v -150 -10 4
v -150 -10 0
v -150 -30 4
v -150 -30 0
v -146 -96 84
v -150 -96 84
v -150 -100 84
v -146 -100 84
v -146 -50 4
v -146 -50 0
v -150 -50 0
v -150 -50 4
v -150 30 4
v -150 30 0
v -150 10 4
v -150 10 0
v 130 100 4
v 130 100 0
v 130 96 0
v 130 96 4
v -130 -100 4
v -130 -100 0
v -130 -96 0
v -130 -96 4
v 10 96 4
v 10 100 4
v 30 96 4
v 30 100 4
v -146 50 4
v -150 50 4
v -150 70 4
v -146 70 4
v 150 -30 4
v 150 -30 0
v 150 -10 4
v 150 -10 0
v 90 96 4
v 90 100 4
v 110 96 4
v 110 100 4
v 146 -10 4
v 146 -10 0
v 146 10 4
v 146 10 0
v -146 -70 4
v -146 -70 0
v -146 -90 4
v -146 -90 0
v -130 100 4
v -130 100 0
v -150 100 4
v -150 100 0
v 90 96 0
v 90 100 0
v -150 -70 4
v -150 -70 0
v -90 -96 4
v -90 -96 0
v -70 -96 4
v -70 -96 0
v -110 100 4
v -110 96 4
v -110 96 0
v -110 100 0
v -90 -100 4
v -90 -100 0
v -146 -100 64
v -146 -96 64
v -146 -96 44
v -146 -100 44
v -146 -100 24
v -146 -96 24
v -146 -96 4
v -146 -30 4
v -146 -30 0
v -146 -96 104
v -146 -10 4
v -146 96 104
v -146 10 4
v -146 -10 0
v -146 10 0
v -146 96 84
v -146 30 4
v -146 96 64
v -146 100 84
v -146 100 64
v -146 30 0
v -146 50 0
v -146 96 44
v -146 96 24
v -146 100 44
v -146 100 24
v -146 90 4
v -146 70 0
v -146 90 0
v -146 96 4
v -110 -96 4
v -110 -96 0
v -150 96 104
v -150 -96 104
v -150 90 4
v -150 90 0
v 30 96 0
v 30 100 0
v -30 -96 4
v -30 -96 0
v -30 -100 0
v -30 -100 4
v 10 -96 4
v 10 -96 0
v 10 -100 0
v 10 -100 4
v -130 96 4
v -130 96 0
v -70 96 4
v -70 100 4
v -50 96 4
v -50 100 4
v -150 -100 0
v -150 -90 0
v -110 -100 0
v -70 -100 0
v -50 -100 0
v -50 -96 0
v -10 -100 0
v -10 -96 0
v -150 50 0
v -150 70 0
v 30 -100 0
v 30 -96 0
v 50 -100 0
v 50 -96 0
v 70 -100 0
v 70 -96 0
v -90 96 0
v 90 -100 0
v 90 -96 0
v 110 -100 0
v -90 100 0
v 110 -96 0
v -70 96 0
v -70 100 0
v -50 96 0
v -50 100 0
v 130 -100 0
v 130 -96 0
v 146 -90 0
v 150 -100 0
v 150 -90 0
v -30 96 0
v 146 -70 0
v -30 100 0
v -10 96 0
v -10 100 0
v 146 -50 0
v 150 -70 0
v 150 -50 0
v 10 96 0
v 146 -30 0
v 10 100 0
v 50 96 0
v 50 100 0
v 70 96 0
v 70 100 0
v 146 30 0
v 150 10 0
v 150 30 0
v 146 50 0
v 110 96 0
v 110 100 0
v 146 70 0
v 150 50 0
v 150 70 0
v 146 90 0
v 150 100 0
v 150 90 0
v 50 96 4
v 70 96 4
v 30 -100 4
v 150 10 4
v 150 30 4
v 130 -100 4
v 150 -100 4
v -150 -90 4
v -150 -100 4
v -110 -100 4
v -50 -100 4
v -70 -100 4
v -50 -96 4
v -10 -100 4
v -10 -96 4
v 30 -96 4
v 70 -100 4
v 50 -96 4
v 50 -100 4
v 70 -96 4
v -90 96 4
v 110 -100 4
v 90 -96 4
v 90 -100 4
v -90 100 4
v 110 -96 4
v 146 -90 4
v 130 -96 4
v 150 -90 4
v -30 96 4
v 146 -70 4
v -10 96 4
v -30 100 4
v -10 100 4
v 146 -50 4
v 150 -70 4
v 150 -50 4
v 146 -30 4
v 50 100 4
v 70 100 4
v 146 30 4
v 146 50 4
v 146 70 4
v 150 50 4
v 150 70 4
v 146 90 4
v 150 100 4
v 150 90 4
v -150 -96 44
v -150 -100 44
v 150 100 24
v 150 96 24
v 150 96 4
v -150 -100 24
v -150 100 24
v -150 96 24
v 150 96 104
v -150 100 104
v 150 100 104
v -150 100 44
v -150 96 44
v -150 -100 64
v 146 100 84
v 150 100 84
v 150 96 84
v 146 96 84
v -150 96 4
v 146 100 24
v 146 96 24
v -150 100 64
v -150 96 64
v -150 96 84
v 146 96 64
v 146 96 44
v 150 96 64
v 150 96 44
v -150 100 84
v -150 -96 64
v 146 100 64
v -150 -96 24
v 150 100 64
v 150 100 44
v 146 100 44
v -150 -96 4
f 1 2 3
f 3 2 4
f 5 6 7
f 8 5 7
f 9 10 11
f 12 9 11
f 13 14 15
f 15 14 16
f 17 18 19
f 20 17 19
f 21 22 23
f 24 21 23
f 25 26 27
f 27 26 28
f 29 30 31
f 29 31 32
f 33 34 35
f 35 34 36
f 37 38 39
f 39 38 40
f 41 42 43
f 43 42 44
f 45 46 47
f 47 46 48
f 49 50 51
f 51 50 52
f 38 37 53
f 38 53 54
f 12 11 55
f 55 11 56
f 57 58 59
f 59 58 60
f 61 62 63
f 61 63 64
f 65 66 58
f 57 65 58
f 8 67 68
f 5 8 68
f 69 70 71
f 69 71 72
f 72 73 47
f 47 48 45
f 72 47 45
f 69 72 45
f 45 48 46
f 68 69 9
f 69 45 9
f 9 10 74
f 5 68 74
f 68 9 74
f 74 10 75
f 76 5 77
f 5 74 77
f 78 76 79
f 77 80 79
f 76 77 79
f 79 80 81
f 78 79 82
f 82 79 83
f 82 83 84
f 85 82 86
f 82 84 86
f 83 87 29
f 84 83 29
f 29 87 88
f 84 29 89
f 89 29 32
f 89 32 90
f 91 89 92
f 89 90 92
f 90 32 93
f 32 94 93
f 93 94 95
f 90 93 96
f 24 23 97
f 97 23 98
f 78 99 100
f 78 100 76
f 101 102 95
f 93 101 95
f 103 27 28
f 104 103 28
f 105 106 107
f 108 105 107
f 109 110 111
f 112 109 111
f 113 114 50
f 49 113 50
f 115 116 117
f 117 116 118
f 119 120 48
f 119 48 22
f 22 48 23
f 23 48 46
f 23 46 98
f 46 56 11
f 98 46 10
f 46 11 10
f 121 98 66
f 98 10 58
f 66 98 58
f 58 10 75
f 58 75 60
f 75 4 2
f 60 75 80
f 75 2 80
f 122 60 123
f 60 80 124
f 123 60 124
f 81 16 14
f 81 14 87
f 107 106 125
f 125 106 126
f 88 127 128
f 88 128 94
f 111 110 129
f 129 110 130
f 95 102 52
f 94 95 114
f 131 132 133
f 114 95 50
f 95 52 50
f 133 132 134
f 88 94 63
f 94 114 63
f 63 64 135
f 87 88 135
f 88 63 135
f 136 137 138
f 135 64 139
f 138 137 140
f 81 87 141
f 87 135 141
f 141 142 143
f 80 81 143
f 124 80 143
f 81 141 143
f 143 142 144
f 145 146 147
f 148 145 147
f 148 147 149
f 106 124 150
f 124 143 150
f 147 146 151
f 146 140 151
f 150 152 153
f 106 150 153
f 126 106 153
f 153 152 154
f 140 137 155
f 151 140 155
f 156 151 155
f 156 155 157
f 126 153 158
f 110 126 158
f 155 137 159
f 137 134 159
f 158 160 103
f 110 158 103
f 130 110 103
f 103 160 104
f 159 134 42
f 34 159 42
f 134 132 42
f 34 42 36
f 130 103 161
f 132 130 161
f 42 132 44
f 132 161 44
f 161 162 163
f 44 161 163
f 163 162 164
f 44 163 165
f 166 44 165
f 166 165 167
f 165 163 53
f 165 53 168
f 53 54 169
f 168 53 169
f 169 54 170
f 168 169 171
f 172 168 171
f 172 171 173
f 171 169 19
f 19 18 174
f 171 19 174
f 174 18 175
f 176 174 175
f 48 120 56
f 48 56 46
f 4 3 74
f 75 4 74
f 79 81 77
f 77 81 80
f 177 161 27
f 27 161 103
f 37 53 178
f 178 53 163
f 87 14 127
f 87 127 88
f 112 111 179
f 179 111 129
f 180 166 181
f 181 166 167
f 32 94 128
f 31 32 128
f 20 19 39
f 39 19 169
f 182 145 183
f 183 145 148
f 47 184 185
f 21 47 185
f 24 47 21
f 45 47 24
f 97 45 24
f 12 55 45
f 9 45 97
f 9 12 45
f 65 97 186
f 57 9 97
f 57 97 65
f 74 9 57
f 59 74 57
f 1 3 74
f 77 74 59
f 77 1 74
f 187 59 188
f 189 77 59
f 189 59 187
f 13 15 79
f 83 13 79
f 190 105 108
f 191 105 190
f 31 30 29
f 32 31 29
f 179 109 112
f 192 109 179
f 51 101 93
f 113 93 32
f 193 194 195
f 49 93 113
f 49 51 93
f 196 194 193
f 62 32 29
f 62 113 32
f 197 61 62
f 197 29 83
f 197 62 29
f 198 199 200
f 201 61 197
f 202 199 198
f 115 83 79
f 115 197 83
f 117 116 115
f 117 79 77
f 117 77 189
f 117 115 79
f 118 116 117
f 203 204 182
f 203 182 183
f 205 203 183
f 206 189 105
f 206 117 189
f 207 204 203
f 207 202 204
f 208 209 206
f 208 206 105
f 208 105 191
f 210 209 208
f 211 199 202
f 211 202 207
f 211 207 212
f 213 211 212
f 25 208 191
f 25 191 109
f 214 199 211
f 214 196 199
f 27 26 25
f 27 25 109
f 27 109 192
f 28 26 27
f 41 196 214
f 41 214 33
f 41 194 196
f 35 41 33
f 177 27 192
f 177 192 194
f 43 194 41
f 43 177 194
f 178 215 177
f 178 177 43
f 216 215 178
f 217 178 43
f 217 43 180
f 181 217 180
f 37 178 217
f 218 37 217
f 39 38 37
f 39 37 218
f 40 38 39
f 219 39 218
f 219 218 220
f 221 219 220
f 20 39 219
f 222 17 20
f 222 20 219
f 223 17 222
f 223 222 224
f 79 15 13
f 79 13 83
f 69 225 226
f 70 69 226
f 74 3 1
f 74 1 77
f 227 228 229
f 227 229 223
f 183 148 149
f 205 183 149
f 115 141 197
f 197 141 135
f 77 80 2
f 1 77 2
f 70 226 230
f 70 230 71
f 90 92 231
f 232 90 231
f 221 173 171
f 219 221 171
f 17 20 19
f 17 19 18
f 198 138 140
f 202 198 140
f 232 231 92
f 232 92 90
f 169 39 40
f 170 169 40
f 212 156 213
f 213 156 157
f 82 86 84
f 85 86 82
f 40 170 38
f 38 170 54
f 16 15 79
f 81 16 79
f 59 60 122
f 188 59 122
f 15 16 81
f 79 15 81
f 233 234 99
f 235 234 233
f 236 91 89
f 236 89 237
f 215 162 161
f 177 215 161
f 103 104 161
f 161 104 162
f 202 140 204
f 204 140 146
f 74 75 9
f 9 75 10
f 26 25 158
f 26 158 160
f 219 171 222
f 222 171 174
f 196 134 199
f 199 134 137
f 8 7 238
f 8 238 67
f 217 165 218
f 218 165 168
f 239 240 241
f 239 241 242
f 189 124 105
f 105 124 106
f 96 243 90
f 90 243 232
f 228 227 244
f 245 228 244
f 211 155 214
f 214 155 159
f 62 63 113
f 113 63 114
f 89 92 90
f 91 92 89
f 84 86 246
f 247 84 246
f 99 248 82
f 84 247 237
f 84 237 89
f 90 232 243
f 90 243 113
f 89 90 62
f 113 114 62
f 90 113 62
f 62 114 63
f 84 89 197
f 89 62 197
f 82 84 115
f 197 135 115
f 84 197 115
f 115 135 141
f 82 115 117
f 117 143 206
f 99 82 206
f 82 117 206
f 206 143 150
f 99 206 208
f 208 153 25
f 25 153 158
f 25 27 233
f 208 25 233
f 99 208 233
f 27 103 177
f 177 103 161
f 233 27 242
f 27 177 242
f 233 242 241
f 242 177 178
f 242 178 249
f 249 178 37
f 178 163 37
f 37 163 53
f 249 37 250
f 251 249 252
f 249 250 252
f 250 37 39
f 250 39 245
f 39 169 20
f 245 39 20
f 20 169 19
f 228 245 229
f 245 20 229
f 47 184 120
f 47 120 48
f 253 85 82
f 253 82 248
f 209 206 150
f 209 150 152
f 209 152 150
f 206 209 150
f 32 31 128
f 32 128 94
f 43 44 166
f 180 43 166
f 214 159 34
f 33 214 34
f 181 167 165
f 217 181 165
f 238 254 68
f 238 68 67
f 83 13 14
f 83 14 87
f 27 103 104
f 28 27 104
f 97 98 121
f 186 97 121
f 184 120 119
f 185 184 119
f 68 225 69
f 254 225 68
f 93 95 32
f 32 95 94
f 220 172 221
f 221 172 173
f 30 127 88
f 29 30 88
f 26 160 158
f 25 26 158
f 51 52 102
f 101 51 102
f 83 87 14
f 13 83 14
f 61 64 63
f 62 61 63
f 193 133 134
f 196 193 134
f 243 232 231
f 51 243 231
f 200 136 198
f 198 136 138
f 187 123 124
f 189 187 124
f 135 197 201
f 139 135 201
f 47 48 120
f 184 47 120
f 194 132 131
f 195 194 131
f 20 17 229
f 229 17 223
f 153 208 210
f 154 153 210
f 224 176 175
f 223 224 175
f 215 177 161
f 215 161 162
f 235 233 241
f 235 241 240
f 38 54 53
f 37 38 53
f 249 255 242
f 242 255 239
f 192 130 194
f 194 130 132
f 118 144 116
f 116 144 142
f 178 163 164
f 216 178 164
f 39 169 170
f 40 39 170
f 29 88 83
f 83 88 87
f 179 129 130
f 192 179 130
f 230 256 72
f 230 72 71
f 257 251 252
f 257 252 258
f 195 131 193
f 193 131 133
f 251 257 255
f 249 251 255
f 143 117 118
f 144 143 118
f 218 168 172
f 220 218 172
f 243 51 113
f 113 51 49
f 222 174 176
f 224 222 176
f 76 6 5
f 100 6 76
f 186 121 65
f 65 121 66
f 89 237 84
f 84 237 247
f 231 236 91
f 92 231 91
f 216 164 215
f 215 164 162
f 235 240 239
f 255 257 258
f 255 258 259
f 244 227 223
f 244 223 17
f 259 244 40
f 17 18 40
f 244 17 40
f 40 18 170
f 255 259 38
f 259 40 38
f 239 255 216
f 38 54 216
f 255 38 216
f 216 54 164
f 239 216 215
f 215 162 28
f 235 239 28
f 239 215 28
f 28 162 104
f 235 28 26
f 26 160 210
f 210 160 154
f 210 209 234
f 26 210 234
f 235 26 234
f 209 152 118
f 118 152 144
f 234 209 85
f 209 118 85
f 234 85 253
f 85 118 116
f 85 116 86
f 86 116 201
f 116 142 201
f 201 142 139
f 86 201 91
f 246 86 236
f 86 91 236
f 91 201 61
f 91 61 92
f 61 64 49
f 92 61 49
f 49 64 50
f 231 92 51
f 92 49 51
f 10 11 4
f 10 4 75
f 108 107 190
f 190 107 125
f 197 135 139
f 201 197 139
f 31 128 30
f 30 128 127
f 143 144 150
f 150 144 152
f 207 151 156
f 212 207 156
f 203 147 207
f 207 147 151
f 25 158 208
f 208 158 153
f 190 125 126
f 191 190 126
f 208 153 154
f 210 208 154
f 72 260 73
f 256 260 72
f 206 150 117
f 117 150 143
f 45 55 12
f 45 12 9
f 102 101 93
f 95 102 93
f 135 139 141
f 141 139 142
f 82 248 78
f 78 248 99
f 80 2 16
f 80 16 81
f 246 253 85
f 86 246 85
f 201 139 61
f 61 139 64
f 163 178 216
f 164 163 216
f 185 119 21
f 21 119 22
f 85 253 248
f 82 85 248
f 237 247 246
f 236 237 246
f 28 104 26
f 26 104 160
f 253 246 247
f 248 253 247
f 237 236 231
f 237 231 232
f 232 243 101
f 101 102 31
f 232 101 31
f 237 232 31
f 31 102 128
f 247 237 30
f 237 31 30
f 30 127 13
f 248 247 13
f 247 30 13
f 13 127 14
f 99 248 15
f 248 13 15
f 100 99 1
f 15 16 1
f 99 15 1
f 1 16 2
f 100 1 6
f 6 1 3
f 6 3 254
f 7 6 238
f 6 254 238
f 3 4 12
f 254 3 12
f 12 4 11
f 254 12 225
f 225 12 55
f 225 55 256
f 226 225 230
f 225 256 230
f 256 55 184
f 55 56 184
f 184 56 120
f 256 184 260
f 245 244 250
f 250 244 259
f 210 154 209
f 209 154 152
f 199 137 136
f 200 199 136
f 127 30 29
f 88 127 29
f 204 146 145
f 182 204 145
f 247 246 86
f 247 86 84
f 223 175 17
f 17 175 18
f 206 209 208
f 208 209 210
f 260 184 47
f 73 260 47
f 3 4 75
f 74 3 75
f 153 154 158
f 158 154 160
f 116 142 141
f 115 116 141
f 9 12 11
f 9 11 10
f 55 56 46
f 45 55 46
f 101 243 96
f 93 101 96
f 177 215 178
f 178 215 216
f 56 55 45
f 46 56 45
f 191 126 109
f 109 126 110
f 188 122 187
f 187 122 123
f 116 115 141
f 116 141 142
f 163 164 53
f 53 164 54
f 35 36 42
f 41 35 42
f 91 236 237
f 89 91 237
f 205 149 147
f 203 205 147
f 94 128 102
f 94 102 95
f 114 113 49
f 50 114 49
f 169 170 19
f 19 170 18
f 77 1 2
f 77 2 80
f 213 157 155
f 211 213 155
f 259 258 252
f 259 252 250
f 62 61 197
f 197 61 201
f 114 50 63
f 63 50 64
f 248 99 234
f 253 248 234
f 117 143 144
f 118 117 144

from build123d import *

# Parameters (mm, degrees)
F1_DEPTH  = 4
F2_W      = 20
F2_H      = 4
F3_DEPTH  = 4
F4_W      = 20
F4_H      = 4
F5_DEPTH  = 100
F7_W      = 4
F7_H      = 20
F8_DEPTH  = 4
F9_W      = 4
F9_H      = 10
F9_H_2    = 20
F10_DEPTH = 100
F12_W     = 4
F12_H     = 20
F13_DEPTH = 4
F14_W     = 4
F14_H     = 20
F15_DEPTH = 4


with BuildPart() as f1:
    # F0 (on Top) → F1 (new body)
    with BuildSketch(Plane.XY):
        Polygon((150, 90), (150, 100), (130, 100), (130, 96), (120, 96), (110, 96), (110, 100), (90, 100), (90, 96), (80, 96), (70, 96), (70, 100), (50, 100), (50, 96), (40, 96), (30, 96), (30, 100), (10, 100), (10, 96), (0, 96), (-10, 96), (-10, 100), (-30, 100), (-30, 96), (-40, 96), (-50, 96), (-50, 100), (-70, 100), (-70, 96), (-80, 96), (-90, 96), (-90, 100), (-110, 100), (-110, 96), (-120, 96), (-130, 96), (-130, 100), (-150, 100), (-150, 90), (-146, 90), (-146, 80), (-146, 70), (-150, 70), (-150, 50), (-146, 50), (-146, 40), (-146, 30), (-150, 30), (-150, 10), (-146, 10), (-146, 0), (-146, -10), (-150, -10), (-150, -30), (-146, -30), (-146, -40), (-146, -50), (-150, -50), (-150, -70), (-146, -70), (-146, -80), (-146, -90), (-150, -90), (-150, -100), (-130, -100), (-130, -96), (-120, -96), (-110, -96), (-110, -100), (-90, -100), (-90, -96), (-80, -96), (-70, -96), (-70, -100), (-50, -100), (-50, -96), (-40, -96), (-30, -96), (-30, -100), (-10, -100), (-10, -96), (0, -96), (10, -96), (10, -100), (30, -100), (30, -96), (40, -96), (50, -96), (50, -100), (70, -100), (70, -96), (80, -96), (90, -96), (90, -100), (110, -100), (110, -96), (120, -96), (130, -96), (130, -100), (150, -100), (150, -90), (146, -90), (146, -80), (146, -70), (150, -70), (150, -50), (146, -50), (146, -40), (146, -30), (150, -30), (150, -10), (146, -10), (146, 0), (146, 10), (150, 10), (150, 30), (146, 30), (146, 40), (146, 50), (150, 50), (150, 70), (146, 70), (146, 80), (146, 90), align=None)
    extrude(amount=F1_DEPTH)


with BuildPart() as f3:
    # F2 (on face) → F3 (new body, through all)
    with BuildSketch(Plane.XY.offset(4)):
        with Locations((-120, 98)):
            Rectangle(F2_W, F2_H)
    extrude(amount=-F3_DEPTH)



with BuildPart() as f3b:
    # F2 (on face) → F3, piece 2 (new body, through all)
    with BuildSketch(Plane.XY.offset(4)):
        with Locations((120, 98)):
            Rectangle(F2_W, F2_H)
    extrude(amount=-F3_DEPTH)


with BuildPart() as f3c:
    # F2 (on face) → F3, piece 3 (new body, through all)
    with BuildSketch(Plane.XY.offset(4)):
        with Locations((80, 98)):
            Rectangle(F2_W, F2_H)
    extrude(amount=-F3_DEPTH)


with BuildPart() as f3d:
    # F2 (on face) → F3, piece 4 (new body, through all)
    with BuildSketch(Plane.XY.offset(4)):
        with Locations((40, 98)):
            Rectangle(F2_W, F2_H)
    extrude(amount=-F3_DEPTH)


with BuildPart() as f3e:
    # F2 (on face) → F3, piece 5 (new body, through all)
    with BuildSketch(Plane.XY.offset(4)):
        with Locations((0, 98)):
            Rectangle(F2_W, F2_H)
    extrude(amount=-F3_DEPTH)


with BuildPart() as f3f:
    # F2 (on face) → F3, piece 6 (new body, through all)
    with BuildSketch(Plane.XY.offset(4)):
        with Locations((-40, 98)):
            Rectangle(F2_W, F2_H)
    extrude(amount=-F3_DEPTH)


with BuildPart() as f3g:
    # F2 (on face) → F3, piece 7 (new body, through all)
    with BuildSketch(Plane.XY.offset(4)):
        with Locations((-80, 98)):
            Rectangle(F2_W, F2_H)
    extrude(amount=-F3_DEPTH)


with BuildPart() as f3_1:
    add(f3.part)

    add(f3b.part)  # F5 merges F3b

    add(f3c.part)  # F5 merges F3c

    add(f3d.part)  # F5 merges F3d

    add(f3e.part)  # F5 merges F3e

    add(f3f.part)  # F5 merges F3f

    add(f3g.part)  # F5 merges F3g
    # F4 (on face) → F5 (join)
    with BuildSketch(Plane.XY.offset(4)):
        with Locations((140, 98)):
            Rectangle(F4_W, F4_H)
        with Locations((120, 98)):
            Rectangle(F4_W, F4_H)
        with Locations((100, 98)):
            Rectangle(F4_W, F4_H)
        with Locations((80, 98)):
            Rectangle(F4_W, F4_H)
        with Locations((60, 98)):
            Rectangle(F4_W, F4_H)
        with Locations((40, 98)):
            Rectangle(F4_W, F4_H)
        with Locations((20, 98)):
            Rectangle(F4_W, F4_H)
        with Locations((0, 98)):
            Rectangle(F4_W, F4_H)
        with Locations((-20, 98)):
            Rectangle(F4_W, F4_H)
        with Locations((-40, 98)):
            Rectangle(F4_W, F4_H)
        with Locations((-60, 98)):
            Rectangle(F4_W, F4_H)
        with Locations((-80, 98)):
            Rectangle(F4_W, F4_H)
        with Locations((-100, 98)):
            Rectangle(F4_W, F4_H)
        with Locations((-120, 98)):
            Rectangle(F4_W, F4_H)
        with Locations((-140, 98)):
            Rectangle(F4_W, F4_H)
    extrude(amount=F5_DEPTH)

    # F6: union 

    # F14 (on face) → F15 (cut, through all)
    with BuildSketch(Plane(origin=(0, 100, 0), x_dir=(-1, 0, 0), z_dir=(0, 1, 0))):
        with Locations((-148, 74)):
            Rectangle(F14_W, F14_H)
        with Locations((-148, 34)):
            Rectangle(F14_W, F14_H)
        with Locations((148, 74)):
            Rectangle(F14_W, F14_H)
        with Locations((148, 34)):
            Rectangle(F14_W, F14_H)
    extrude(amount=-F15_DEPTH, mode=Mode.SUBTRACT)


with BuildPart() as f8:
    # F7 (on face) → F8 (new body, through all)
    with BuildSketch(Plane.XY.offset(4)):
        with Locations((-148, 80)):
            Rectangle(F7_W, F7_H)
    extrude(amount=-F8_DEPTH)



with BuildPart() as f8b:
    # F7 (on face) → F8, piece 2 (new body, through all)
    with BuildSketch(Plane.XY.offset(4)):
        with Locations((-148, 40)):
            Rectangle(F7_W, F7_H)
    extrude(amount=-F8_DEPTH)


with BuildPart() as f8c:
    # F7 (on face) → F8, piece 3 (new body, through all)
    with BuildSketch(Plane.XY.offset(4)):
        with Locations((-148, 0)):
            Rectangle(F7_W, F7_H)
    extrude(amount=-F8_DEPTH)


with BuildPart() as f8d:
    # F7 (on face) → F8, piece 4 (new body, through all)
    with BuildSketch(Plane.XY.offset(4)):
        with Locations((-148, -40)):
            Rectangle(F7_W, F7_H)
    extrude(amount=-F8_DEPTH)


with BuildPart() as f8e:
    # F7 (on face) → F8, piece 5 (new body, through all)
    with BuildSketch(Plane.XY.offset(4)):
        with Locations((-148, -80)):
            Rectangle(F7_W, F7_H)
    extrude(amount=-F8_DEPTH)


with BuildPart() as f8_1:
    add(f8.part)

    add(f8b.part)  # F10 merges F8b

    add(f8c.part)  # F10 merges F8c

    add(f8d.part)  # F10 merges F8d

    add(f8e.part)  # F10 merges F8e
    # F9 (on face) → F10 (join)
    with BuildSketch(Plane.XY.offset(4)):
        with Locations((-148, -95)):
            Rectangle(F9_W, F9_H)
        with Locations((-148, -80)):
            Rectangle(F9_W, F9_H_2)
        with Locations((-148, -60)):
            Rectangle(F9_W, F9_H_2)
        with Locations((-148, -40)):
            Rectangle(F9_W, F9_H_2)
        with Locations((-148, -20)):
            Rectangle(F9_W, F9_H_2)
        with Locations((-148, 0)):
            Rectangle(F9_W, F9_H_2)
        with Locations((-148, 20)):
            Rectangle(F9_W, F9_H_2)
        with Locations((-148, 40)):
            Rectangle(F9_W, F9_H_2)
        with Locations((-148, 60)):
            Rectangle(F9_W, F9_H_2)
        with Locations((-148, 80)):
            Rectangle(F9_W, F9_H_2)
        with Locations((-148, 95)):
            Rectangle(F9_W, F9_H)
    extrude(amount=F10_DEPTH)

    # F11: union 

    # F12 (on face) → F13 (cut, through all)
    with BuildSketch(Plane(origin=(-150, 0, 0), x_dir=(0, -1, 0), z_dir=(-1, 0, 0))):
        with Locations((-98, 14)):
            Rectangle(F12_W, F12_H)
        with Locations((-98, 54)):
            Rectangle(F12_W, F12_H)
        with Locations((-98, 94)):
            Rectangle(F12_W, F12_H)
        with Locations((98, 14)):
            Rectangle(F12_W, F12_H)
        with Locations((98, 54)):
            Rectangle(F12_W, F12_H)
        with Locations((98, 94)):
            Rectangle(F12_W, F12_H)
    extrude(amount=-F13_DEPTH, mode=Mode.SUBTRACT)


solid = Compound([f1.part, f3_1.part, f8_1.part])
